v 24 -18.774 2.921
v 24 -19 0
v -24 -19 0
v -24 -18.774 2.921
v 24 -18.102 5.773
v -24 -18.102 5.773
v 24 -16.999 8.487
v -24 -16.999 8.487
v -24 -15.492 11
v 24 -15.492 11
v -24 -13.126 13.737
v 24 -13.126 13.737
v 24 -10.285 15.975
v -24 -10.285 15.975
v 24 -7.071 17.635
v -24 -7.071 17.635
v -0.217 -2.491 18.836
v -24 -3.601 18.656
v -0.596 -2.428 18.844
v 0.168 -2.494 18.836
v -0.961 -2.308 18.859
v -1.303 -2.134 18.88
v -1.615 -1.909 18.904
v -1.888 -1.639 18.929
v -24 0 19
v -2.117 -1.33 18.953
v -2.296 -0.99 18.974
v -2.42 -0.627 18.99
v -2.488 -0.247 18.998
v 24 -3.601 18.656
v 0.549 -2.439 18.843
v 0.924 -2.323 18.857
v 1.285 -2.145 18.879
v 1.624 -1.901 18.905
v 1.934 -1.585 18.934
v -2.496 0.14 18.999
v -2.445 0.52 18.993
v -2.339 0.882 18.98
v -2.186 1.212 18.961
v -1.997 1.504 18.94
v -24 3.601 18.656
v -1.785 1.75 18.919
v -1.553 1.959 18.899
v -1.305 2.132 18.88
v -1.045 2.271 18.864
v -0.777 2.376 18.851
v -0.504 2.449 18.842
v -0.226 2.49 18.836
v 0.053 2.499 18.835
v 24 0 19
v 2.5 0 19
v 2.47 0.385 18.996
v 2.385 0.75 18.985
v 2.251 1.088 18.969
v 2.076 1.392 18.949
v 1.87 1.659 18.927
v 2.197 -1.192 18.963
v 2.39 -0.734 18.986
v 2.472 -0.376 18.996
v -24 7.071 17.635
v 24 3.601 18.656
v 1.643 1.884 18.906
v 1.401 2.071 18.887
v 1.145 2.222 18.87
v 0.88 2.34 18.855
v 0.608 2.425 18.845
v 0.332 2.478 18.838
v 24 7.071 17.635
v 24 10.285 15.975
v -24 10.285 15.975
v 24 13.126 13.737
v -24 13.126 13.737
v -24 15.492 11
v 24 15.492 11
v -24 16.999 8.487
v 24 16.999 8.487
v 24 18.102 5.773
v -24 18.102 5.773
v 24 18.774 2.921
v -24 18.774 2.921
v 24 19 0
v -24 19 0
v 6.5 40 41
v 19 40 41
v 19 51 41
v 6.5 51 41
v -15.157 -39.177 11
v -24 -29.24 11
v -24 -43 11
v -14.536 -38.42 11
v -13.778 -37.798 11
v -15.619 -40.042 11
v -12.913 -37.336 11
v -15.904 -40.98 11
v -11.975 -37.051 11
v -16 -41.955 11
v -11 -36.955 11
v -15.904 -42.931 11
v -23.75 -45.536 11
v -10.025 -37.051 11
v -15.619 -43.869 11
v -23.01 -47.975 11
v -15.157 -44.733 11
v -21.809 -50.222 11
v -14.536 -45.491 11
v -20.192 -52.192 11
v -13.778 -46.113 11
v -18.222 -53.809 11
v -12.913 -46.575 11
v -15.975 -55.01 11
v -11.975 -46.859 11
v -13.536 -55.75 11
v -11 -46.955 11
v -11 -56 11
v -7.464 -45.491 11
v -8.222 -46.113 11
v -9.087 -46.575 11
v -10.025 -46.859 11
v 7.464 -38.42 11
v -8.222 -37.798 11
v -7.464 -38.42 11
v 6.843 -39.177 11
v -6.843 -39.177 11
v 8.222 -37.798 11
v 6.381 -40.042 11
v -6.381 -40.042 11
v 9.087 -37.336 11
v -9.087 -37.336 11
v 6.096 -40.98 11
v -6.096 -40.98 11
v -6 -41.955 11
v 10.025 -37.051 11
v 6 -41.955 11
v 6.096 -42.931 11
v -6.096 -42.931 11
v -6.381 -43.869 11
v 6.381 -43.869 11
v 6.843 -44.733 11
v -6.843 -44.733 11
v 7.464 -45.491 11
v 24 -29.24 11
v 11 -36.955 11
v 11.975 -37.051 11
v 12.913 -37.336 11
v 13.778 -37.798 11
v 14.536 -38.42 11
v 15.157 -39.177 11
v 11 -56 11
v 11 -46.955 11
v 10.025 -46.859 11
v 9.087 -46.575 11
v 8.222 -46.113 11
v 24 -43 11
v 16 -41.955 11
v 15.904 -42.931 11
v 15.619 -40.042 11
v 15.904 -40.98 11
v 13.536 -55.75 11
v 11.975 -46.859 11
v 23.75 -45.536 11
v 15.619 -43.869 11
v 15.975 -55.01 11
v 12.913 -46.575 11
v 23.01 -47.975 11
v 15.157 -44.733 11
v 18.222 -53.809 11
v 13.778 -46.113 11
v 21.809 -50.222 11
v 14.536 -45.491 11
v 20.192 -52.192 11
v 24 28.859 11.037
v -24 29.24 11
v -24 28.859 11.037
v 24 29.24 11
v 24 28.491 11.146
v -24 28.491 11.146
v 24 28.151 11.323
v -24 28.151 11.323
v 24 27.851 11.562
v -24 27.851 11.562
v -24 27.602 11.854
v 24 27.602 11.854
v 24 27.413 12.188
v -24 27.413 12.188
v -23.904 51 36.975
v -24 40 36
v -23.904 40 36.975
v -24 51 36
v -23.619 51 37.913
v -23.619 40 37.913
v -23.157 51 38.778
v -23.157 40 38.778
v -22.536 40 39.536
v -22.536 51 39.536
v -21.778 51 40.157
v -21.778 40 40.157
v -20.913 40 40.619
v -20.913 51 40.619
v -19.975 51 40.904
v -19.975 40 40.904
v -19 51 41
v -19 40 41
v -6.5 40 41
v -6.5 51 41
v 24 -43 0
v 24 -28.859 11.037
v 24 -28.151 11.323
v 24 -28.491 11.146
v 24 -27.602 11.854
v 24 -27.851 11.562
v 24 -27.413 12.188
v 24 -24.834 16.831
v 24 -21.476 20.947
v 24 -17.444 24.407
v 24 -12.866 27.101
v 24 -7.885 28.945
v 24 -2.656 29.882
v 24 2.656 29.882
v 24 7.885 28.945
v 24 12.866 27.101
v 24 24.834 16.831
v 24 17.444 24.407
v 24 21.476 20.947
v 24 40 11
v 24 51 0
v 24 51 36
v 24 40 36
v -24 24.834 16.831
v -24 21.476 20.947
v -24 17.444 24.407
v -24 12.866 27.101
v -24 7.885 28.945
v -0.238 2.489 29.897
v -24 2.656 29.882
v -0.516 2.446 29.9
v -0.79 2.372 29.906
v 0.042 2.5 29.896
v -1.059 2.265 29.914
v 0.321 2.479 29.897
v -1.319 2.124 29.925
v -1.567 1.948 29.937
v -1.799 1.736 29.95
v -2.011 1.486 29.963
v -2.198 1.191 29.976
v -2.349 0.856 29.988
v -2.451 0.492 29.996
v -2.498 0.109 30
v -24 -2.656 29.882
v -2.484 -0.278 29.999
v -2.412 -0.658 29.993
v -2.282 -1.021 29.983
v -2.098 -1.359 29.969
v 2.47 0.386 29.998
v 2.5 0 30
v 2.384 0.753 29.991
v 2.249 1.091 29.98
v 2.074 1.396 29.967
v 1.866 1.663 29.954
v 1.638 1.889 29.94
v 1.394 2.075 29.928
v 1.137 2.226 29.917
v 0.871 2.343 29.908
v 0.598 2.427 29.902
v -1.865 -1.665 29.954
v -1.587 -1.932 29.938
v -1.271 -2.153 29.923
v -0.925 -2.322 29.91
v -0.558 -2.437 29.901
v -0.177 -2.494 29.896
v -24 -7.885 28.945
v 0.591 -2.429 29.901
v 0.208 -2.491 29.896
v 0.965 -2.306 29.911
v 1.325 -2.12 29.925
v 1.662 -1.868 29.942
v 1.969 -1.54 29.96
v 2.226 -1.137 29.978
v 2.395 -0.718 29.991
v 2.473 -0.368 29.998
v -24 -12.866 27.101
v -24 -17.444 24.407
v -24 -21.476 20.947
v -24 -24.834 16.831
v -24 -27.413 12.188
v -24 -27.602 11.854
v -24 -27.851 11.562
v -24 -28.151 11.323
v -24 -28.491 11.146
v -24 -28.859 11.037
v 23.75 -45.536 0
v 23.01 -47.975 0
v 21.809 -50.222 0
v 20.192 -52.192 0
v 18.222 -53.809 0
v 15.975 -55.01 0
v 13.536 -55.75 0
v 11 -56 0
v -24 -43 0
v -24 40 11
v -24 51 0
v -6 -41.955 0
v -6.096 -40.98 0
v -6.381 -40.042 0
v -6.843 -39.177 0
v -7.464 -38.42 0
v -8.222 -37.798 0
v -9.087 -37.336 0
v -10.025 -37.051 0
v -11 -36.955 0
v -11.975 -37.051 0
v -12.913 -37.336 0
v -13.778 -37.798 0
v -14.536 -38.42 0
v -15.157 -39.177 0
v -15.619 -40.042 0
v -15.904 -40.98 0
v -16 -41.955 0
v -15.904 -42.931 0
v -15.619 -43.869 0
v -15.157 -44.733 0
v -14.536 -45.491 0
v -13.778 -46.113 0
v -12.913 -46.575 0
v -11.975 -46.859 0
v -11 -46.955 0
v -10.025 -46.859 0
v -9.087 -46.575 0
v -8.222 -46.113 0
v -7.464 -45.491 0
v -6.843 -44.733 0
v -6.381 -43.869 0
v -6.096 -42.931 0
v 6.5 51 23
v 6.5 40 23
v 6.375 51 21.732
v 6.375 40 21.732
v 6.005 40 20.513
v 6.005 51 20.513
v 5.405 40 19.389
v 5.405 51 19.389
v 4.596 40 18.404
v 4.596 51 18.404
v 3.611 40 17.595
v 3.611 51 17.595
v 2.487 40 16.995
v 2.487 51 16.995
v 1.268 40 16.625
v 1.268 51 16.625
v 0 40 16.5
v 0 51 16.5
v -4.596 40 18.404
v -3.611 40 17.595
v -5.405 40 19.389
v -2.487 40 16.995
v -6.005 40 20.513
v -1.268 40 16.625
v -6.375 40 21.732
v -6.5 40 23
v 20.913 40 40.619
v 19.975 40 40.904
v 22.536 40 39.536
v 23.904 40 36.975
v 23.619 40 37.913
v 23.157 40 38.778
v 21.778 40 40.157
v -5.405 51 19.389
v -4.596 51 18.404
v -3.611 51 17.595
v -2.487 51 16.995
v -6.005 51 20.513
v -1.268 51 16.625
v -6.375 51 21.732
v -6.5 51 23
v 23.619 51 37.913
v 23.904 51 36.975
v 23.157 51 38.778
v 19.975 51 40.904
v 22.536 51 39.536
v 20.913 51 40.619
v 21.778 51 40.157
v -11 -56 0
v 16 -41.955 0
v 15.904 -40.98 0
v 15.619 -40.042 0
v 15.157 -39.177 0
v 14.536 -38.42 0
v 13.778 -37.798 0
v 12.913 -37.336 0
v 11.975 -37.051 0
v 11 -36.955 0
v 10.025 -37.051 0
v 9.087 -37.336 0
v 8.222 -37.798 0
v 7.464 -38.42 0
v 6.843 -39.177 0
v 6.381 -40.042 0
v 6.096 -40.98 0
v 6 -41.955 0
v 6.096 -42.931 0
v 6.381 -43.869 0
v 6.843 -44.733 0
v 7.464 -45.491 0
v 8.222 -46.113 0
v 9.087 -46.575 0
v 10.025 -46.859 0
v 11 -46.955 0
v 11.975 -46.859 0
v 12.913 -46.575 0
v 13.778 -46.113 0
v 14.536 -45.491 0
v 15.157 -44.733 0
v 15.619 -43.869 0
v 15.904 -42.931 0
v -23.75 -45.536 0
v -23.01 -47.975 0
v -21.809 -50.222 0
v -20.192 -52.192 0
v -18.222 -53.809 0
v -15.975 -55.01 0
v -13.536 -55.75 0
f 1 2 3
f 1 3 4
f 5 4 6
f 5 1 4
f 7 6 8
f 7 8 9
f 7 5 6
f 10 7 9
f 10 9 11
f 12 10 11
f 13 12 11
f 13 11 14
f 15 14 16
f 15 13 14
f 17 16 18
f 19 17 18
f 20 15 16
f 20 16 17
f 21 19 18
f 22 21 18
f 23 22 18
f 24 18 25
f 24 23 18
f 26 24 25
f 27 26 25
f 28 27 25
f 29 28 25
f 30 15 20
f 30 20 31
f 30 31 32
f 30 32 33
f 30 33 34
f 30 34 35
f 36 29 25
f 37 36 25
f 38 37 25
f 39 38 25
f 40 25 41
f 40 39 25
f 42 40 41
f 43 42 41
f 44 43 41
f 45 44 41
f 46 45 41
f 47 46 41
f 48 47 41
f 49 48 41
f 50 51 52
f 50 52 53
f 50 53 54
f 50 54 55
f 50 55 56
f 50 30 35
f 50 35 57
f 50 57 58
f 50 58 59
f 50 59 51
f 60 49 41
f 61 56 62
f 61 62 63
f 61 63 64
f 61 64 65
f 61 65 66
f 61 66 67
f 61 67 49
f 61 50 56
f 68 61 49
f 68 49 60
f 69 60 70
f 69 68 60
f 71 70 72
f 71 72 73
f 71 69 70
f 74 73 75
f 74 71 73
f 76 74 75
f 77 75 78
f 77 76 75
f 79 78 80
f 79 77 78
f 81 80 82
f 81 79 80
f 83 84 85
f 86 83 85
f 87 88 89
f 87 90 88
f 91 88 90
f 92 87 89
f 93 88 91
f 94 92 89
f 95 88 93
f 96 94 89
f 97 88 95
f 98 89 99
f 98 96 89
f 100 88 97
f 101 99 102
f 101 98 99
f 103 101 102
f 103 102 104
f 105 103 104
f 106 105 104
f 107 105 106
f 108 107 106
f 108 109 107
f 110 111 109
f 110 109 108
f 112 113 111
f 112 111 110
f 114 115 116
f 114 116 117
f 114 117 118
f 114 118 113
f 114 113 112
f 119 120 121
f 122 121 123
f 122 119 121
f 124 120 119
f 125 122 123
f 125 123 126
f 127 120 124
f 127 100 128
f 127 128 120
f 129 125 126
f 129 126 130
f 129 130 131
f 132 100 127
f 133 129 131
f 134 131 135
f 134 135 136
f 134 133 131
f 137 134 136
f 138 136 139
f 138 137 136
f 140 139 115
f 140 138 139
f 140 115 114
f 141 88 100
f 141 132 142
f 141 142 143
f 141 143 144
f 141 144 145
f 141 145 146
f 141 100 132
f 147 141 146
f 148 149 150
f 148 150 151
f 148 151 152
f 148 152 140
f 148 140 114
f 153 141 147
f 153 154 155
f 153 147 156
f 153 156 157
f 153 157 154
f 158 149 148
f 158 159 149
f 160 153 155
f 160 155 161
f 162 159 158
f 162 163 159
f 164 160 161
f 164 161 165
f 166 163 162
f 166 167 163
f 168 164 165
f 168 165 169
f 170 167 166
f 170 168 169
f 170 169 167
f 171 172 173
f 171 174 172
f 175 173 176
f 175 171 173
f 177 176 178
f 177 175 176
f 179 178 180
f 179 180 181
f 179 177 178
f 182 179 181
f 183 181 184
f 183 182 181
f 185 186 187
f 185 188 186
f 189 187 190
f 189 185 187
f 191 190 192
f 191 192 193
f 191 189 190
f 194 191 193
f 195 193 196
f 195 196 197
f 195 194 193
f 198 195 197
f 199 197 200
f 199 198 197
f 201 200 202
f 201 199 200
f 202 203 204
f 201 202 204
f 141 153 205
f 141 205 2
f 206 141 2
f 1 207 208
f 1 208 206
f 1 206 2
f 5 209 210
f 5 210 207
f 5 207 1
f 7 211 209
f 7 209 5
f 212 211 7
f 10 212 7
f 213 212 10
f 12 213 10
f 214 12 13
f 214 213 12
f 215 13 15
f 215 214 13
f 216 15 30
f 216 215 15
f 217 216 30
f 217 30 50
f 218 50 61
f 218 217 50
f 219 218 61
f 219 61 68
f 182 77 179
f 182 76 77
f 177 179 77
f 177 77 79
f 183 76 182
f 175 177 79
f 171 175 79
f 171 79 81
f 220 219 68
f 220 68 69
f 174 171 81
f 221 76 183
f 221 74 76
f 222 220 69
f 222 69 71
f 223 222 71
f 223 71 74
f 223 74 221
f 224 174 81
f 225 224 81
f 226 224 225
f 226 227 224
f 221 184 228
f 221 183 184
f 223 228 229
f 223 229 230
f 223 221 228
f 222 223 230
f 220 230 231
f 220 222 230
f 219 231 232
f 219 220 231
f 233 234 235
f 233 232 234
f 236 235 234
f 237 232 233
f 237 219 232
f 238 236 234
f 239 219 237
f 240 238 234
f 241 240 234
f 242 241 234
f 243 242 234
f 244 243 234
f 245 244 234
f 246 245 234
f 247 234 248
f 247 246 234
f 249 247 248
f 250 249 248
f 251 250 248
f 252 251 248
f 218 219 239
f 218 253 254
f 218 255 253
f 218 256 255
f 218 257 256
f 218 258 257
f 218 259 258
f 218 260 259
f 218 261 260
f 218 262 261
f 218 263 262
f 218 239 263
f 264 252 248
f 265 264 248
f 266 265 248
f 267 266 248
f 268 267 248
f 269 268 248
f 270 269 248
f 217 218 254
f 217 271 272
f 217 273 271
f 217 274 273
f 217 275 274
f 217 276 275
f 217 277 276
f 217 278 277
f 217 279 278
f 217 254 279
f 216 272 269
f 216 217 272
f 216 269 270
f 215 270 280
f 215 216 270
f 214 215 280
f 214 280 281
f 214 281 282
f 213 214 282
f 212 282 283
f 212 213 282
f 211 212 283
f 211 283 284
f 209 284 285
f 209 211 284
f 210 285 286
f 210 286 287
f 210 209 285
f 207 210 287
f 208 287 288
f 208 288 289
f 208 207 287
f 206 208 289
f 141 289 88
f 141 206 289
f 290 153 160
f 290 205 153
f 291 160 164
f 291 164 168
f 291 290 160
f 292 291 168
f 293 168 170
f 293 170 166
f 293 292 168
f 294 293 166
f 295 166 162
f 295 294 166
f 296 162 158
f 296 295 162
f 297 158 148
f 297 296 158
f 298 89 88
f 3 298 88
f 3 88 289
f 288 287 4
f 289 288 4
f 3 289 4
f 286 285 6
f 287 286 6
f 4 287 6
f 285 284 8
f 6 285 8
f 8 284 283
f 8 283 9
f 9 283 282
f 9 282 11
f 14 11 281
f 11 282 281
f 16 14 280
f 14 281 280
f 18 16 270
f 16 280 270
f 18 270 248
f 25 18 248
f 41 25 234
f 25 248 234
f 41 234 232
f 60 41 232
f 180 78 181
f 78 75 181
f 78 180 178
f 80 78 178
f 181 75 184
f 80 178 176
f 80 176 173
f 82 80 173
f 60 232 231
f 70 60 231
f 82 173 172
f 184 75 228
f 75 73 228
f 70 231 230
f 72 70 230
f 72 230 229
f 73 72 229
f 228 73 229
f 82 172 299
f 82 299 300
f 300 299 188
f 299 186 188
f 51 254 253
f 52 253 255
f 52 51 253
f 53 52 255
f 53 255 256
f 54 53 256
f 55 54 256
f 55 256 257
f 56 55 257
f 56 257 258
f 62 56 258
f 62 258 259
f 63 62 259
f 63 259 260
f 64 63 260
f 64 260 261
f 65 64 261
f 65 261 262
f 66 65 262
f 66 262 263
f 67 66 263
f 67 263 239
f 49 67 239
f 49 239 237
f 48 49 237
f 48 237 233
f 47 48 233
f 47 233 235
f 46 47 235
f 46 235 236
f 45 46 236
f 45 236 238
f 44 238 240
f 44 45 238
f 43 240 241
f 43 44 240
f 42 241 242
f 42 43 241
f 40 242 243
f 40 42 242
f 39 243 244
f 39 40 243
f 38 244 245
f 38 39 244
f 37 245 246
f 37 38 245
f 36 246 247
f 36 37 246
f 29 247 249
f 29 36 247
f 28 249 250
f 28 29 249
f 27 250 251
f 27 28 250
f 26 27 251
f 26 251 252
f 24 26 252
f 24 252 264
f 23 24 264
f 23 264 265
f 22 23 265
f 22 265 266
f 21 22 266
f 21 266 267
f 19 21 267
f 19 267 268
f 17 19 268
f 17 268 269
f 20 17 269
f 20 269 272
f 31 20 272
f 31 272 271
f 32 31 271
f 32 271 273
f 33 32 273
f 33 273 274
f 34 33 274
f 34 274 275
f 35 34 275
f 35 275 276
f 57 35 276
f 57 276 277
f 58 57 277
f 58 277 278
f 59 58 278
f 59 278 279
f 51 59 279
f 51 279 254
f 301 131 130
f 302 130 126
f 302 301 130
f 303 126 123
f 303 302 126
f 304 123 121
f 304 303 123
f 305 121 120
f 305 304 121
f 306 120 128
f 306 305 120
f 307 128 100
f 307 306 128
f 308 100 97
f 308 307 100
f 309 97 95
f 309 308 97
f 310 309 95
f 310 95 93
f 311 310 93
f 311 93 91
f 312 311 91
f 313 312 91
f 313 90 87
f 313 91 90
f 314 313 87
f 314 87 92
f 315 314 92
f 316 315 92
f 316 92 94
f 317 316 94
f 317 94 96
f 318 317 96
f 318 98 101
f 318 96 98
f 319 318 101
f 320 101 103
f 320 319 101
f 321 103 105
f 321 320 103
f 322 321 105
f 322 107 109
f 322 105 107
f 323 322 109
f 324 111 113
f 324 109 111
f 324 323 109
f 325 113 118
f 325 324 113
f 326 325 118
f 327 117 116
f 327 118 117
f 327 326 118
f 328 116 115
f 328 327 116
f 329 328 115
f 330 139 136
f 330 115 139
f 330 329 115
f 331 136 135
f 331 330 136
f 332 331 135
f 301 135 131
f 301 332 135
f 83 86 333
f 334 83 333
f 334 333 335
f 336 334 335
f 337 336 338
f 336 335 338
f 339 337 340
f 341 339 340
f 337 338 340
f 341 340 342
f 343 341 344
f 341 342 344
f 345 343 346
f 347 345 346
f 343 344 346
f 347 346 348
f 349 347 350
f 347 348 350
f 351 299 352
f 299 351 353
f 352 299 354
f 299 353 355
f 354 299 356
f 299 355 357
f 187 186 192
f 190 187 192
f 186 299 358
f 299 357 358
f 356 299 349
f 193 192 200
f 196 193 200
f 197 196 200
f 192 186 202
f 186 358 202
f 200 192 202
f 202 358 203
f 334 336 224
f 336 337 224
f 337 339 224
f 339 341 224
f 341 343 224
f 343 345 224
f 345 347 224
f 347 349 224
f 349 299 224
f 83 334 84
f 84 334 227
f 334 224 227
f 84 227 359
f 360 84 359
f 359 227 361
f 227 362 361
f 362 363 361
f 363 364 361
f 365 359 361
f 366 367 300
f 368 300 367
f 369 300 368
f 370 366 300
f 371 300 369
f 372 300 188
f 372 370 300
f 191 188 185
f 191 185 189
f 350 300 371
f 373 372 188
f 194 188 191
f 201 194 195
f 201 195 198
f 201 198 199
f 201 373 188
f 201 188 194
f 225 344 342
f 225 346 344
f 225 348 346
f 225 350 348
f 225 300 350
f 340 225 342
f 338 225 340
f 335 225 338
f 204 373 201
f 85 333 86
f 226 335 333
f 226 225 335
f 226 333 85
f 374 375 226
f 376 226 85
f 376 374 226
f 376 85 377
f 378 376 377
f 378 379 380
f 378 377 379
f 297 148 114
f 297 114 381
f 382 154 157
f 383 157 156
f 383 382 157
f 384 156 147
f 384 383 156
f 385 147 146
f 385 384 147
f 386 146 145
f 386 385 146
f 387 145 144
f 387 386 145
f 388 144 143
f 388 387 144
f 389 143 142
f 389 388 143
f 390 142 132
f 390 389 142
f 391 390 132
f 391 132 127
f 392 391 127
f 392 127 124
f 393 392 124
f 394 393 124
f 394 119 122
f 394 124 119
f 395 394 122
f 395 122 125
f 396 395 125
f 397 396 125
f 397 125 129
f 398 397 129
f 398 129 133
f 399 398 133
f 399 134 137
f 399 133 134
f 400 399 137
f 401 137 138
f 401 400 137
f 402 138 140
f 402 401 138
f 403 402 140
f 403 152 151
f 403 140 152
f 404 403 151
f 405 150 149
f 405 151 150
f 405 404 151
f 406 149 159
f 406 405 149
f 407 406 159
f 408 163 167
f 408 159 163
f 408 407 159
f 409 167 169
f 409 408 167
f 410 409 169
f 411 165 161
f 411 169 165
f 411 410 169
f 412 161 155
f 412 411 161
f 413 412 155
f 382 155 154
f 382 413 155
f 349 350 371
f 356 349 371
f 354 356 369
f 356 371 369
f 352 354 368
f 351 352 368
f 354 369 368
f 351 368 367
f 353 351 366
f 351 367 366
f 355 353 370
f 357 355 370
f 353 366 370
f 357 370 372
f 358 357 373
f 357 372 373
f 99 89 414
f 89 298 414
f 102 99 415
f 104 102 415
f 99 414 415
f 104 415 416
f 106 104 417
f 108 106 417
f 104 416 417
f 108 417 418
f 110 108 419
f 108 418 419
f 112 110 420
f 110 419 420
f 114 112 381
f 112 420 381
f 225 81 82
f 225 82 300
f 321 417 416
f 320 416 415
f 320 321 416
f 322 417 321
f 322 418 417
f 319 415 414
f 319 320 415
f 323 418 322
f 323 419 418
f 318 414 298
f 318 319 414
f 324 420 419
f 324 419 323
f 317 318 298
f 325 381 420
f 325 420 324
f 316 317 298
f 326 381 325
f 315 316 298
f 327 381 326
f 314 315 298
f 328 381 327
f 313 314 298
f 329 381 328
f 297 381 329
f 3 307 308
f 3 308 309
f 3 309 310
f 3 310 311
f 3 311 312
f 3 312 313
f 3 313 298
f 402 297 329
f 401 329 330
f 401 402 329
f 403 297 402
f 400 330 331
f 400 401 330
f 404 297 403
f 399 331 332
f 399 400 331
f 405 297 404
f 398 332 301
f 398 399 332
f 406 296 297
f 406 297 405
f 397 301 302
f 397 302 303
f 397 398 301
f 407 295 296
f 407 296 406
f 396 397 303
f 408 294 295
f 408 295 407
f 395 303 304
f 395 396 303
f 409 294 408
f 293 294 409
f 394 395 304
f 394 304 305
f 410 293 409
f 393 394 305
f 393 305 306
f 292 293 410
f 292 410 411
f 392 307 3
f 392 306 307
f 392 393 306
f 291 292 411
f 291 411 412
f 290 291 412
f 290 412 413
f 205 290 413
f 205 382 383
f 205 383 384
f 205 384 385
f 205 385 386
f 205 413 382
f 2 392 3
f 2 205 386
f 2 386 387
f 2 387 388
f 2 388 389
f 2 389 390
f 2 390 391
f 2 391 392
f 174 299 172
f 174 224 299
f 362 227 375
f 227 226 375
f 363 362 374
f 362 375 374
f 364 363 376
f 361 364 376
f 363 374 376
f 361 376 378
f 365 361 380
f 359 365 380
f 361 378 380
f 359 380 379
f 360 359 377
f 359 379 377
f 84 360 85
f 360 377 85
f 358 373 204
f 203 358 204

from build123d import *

# Parameters (mm, degrees)
F0_W     = 11
F0_H     = 30
F1_DEPTH = 24
F3_DEPTH = 11
F4_R     = 2.5
F4_R_2   = 5
F5_DEPTH = 41.001
F6_R     = 13
F7_R     = 5
F8_R     = 2


with BuildPart() as f1:
    # F0 (on Right) → F1 (new body, symmetric)
    with BuildSketch(Plane.YZ):
        with Locations((45.5, 26)):
            Rectangle(F0_W, F0_H)
        with BuildLine():
            ThreePointArc((27.9105714739, 11), (29.4730143031, 5.5983415304), (30, 0))
            Line((30, 0), (51, 0))
            Line((51, 0), (51, 11))
            Line((51, 11), (40, 11))
            Line((40, 11), (27.9105714739, 11))
        make_face()
        with BuildLine():
            ThreePointArc((-15.4919333848, 11), (0, 19), (15.4919333848, 11))
            Line((15.4919333848, 11), (27.9105714739, 11))
            ThreePointArc((27.9105714739, 11), (0, 30), (-27.9105714739, 11))
            Line((-27.9105714739, 11), (-15.4919333848, 11))
        make_face()
        with BuildLine():
            ThreePointArc((15.4919333848, 11), (18.1017503893, 5.7729223833), (19, 0))
            Line((19, 0), (30, 0))
            ThreePointArc((30, 0), (29.4730143031, 5.5983415304), (27.9105714739, 11))
            Line((27.9105714739, 11), (15.4919333848, 11))
        make_face()
        with BuildLine():
            Line((-30, 0), (-19, 0))
            ThreePointArc((-19, 0), (-18.1017503893, 5.7729223833), (-15.4919333848, 11))
            Line((-15.4919333848, 11), (-27.9105714739, 11))
            ThreePointArc((-27.9105714739, 11), (-29.4730143031, 5.5983415304), (-30, 0))
        make_face()
        with BuildLine():
            Line((-56, 0), (-30, 0))
            ThreePointArc((-30, 0), (-29.4730143031, 5.5983415304), (-27.9105714739, 11))
            Line((-27.9105714739, 11), (-56, 11))
            Line((-56, 11), (-56, 0))
        make_face()
    extrude(amount=F1_DEPTH, both=True)

    # F2 (on face) → F3 (cut, through all)
    with BuildSketch(Plane(origin=(0, 51, 0), x_dir=(-1, 0, 0), z_dir=(0, 1, 0))):
        with BuildLine():
            ThreePointArc((-6.5, 23), (-4.5961940777, 27.5961940777), (0, 29.5))
            Line((0, 29.5), (0, 41))
            Line((0, 41), (-6.5, 41))
            Line((-6.5, 41), (-6.5, 23))
        make_face()
        with BuildLine():
            ThreePointArc((-6.5, 23), (-4.5961940777, 18.4038059223), (0, 16.5))
            Line((0, 16.5), (0, 29.5))
            ThreePointArc((0, 29.5), (-4.5961940777, 27.5961940777), (-6.5, 23))
        make_face()
        with BuildLine():
            Line((0, 29.5), (0, 16.5))
            ThreePointArc((0, 16.5), (4.5961940777, 18.4038059223), (6.5, 23))
            ThreePointArc((6.5, 23), (4.5961940777, 27.5961940777), (0, 29.5))
        make_face()
        with BuildLine():
            Line((0, 41), (0, 29.5))
            ThreePointArc((0, 29.5), (4.5961940777, 27.5961940777), (6.5, 23))
            Line((6.5, 23), (6.5, 41))
            Line((6.5, 41), (0, 41))
        make_face()
    extrude(amount=-F3_DEPTH, mode=Mode.SUBTRACT)

    # F4 (on Top) → F5 (cut, through all)
    with BuildSketch(Plane.XY):
        Circle(F4_R)
        with Locations((11, -41.955285737)):
            Circle(F4_R_2)
        with Locations((-11, -41.955285737)):
            Circle(F4_R_2)
    extrude(amount=F5_DEPTH, mode=Mode.SUBTRACT)

    # F6
    f6_edges = [f1.edges().sort_by_distance(p)[0] for p in [
        (-24, -56, 5.5),
        (24, -56, 5.5),
    ]]
    fillet(f6_edges, radius=F6_R)

    # F7
    f7_edges = [f1.edges().sort_by_distance(p)[0] for p in [
        (-24, 45.5, 41),
        (24, 45.5, 41),
    ]]
    fillet(f7_edges, radius=F7_R)

    # F8
    f8_edges = [f1.edges().sort_by_distance(p)[0] for p in [
        (0, -27.910571, 11),
        (0, 27.910571, 11),
    ]]
    fillet(f8_edges, radius=F8_R)


solid = f1.part
